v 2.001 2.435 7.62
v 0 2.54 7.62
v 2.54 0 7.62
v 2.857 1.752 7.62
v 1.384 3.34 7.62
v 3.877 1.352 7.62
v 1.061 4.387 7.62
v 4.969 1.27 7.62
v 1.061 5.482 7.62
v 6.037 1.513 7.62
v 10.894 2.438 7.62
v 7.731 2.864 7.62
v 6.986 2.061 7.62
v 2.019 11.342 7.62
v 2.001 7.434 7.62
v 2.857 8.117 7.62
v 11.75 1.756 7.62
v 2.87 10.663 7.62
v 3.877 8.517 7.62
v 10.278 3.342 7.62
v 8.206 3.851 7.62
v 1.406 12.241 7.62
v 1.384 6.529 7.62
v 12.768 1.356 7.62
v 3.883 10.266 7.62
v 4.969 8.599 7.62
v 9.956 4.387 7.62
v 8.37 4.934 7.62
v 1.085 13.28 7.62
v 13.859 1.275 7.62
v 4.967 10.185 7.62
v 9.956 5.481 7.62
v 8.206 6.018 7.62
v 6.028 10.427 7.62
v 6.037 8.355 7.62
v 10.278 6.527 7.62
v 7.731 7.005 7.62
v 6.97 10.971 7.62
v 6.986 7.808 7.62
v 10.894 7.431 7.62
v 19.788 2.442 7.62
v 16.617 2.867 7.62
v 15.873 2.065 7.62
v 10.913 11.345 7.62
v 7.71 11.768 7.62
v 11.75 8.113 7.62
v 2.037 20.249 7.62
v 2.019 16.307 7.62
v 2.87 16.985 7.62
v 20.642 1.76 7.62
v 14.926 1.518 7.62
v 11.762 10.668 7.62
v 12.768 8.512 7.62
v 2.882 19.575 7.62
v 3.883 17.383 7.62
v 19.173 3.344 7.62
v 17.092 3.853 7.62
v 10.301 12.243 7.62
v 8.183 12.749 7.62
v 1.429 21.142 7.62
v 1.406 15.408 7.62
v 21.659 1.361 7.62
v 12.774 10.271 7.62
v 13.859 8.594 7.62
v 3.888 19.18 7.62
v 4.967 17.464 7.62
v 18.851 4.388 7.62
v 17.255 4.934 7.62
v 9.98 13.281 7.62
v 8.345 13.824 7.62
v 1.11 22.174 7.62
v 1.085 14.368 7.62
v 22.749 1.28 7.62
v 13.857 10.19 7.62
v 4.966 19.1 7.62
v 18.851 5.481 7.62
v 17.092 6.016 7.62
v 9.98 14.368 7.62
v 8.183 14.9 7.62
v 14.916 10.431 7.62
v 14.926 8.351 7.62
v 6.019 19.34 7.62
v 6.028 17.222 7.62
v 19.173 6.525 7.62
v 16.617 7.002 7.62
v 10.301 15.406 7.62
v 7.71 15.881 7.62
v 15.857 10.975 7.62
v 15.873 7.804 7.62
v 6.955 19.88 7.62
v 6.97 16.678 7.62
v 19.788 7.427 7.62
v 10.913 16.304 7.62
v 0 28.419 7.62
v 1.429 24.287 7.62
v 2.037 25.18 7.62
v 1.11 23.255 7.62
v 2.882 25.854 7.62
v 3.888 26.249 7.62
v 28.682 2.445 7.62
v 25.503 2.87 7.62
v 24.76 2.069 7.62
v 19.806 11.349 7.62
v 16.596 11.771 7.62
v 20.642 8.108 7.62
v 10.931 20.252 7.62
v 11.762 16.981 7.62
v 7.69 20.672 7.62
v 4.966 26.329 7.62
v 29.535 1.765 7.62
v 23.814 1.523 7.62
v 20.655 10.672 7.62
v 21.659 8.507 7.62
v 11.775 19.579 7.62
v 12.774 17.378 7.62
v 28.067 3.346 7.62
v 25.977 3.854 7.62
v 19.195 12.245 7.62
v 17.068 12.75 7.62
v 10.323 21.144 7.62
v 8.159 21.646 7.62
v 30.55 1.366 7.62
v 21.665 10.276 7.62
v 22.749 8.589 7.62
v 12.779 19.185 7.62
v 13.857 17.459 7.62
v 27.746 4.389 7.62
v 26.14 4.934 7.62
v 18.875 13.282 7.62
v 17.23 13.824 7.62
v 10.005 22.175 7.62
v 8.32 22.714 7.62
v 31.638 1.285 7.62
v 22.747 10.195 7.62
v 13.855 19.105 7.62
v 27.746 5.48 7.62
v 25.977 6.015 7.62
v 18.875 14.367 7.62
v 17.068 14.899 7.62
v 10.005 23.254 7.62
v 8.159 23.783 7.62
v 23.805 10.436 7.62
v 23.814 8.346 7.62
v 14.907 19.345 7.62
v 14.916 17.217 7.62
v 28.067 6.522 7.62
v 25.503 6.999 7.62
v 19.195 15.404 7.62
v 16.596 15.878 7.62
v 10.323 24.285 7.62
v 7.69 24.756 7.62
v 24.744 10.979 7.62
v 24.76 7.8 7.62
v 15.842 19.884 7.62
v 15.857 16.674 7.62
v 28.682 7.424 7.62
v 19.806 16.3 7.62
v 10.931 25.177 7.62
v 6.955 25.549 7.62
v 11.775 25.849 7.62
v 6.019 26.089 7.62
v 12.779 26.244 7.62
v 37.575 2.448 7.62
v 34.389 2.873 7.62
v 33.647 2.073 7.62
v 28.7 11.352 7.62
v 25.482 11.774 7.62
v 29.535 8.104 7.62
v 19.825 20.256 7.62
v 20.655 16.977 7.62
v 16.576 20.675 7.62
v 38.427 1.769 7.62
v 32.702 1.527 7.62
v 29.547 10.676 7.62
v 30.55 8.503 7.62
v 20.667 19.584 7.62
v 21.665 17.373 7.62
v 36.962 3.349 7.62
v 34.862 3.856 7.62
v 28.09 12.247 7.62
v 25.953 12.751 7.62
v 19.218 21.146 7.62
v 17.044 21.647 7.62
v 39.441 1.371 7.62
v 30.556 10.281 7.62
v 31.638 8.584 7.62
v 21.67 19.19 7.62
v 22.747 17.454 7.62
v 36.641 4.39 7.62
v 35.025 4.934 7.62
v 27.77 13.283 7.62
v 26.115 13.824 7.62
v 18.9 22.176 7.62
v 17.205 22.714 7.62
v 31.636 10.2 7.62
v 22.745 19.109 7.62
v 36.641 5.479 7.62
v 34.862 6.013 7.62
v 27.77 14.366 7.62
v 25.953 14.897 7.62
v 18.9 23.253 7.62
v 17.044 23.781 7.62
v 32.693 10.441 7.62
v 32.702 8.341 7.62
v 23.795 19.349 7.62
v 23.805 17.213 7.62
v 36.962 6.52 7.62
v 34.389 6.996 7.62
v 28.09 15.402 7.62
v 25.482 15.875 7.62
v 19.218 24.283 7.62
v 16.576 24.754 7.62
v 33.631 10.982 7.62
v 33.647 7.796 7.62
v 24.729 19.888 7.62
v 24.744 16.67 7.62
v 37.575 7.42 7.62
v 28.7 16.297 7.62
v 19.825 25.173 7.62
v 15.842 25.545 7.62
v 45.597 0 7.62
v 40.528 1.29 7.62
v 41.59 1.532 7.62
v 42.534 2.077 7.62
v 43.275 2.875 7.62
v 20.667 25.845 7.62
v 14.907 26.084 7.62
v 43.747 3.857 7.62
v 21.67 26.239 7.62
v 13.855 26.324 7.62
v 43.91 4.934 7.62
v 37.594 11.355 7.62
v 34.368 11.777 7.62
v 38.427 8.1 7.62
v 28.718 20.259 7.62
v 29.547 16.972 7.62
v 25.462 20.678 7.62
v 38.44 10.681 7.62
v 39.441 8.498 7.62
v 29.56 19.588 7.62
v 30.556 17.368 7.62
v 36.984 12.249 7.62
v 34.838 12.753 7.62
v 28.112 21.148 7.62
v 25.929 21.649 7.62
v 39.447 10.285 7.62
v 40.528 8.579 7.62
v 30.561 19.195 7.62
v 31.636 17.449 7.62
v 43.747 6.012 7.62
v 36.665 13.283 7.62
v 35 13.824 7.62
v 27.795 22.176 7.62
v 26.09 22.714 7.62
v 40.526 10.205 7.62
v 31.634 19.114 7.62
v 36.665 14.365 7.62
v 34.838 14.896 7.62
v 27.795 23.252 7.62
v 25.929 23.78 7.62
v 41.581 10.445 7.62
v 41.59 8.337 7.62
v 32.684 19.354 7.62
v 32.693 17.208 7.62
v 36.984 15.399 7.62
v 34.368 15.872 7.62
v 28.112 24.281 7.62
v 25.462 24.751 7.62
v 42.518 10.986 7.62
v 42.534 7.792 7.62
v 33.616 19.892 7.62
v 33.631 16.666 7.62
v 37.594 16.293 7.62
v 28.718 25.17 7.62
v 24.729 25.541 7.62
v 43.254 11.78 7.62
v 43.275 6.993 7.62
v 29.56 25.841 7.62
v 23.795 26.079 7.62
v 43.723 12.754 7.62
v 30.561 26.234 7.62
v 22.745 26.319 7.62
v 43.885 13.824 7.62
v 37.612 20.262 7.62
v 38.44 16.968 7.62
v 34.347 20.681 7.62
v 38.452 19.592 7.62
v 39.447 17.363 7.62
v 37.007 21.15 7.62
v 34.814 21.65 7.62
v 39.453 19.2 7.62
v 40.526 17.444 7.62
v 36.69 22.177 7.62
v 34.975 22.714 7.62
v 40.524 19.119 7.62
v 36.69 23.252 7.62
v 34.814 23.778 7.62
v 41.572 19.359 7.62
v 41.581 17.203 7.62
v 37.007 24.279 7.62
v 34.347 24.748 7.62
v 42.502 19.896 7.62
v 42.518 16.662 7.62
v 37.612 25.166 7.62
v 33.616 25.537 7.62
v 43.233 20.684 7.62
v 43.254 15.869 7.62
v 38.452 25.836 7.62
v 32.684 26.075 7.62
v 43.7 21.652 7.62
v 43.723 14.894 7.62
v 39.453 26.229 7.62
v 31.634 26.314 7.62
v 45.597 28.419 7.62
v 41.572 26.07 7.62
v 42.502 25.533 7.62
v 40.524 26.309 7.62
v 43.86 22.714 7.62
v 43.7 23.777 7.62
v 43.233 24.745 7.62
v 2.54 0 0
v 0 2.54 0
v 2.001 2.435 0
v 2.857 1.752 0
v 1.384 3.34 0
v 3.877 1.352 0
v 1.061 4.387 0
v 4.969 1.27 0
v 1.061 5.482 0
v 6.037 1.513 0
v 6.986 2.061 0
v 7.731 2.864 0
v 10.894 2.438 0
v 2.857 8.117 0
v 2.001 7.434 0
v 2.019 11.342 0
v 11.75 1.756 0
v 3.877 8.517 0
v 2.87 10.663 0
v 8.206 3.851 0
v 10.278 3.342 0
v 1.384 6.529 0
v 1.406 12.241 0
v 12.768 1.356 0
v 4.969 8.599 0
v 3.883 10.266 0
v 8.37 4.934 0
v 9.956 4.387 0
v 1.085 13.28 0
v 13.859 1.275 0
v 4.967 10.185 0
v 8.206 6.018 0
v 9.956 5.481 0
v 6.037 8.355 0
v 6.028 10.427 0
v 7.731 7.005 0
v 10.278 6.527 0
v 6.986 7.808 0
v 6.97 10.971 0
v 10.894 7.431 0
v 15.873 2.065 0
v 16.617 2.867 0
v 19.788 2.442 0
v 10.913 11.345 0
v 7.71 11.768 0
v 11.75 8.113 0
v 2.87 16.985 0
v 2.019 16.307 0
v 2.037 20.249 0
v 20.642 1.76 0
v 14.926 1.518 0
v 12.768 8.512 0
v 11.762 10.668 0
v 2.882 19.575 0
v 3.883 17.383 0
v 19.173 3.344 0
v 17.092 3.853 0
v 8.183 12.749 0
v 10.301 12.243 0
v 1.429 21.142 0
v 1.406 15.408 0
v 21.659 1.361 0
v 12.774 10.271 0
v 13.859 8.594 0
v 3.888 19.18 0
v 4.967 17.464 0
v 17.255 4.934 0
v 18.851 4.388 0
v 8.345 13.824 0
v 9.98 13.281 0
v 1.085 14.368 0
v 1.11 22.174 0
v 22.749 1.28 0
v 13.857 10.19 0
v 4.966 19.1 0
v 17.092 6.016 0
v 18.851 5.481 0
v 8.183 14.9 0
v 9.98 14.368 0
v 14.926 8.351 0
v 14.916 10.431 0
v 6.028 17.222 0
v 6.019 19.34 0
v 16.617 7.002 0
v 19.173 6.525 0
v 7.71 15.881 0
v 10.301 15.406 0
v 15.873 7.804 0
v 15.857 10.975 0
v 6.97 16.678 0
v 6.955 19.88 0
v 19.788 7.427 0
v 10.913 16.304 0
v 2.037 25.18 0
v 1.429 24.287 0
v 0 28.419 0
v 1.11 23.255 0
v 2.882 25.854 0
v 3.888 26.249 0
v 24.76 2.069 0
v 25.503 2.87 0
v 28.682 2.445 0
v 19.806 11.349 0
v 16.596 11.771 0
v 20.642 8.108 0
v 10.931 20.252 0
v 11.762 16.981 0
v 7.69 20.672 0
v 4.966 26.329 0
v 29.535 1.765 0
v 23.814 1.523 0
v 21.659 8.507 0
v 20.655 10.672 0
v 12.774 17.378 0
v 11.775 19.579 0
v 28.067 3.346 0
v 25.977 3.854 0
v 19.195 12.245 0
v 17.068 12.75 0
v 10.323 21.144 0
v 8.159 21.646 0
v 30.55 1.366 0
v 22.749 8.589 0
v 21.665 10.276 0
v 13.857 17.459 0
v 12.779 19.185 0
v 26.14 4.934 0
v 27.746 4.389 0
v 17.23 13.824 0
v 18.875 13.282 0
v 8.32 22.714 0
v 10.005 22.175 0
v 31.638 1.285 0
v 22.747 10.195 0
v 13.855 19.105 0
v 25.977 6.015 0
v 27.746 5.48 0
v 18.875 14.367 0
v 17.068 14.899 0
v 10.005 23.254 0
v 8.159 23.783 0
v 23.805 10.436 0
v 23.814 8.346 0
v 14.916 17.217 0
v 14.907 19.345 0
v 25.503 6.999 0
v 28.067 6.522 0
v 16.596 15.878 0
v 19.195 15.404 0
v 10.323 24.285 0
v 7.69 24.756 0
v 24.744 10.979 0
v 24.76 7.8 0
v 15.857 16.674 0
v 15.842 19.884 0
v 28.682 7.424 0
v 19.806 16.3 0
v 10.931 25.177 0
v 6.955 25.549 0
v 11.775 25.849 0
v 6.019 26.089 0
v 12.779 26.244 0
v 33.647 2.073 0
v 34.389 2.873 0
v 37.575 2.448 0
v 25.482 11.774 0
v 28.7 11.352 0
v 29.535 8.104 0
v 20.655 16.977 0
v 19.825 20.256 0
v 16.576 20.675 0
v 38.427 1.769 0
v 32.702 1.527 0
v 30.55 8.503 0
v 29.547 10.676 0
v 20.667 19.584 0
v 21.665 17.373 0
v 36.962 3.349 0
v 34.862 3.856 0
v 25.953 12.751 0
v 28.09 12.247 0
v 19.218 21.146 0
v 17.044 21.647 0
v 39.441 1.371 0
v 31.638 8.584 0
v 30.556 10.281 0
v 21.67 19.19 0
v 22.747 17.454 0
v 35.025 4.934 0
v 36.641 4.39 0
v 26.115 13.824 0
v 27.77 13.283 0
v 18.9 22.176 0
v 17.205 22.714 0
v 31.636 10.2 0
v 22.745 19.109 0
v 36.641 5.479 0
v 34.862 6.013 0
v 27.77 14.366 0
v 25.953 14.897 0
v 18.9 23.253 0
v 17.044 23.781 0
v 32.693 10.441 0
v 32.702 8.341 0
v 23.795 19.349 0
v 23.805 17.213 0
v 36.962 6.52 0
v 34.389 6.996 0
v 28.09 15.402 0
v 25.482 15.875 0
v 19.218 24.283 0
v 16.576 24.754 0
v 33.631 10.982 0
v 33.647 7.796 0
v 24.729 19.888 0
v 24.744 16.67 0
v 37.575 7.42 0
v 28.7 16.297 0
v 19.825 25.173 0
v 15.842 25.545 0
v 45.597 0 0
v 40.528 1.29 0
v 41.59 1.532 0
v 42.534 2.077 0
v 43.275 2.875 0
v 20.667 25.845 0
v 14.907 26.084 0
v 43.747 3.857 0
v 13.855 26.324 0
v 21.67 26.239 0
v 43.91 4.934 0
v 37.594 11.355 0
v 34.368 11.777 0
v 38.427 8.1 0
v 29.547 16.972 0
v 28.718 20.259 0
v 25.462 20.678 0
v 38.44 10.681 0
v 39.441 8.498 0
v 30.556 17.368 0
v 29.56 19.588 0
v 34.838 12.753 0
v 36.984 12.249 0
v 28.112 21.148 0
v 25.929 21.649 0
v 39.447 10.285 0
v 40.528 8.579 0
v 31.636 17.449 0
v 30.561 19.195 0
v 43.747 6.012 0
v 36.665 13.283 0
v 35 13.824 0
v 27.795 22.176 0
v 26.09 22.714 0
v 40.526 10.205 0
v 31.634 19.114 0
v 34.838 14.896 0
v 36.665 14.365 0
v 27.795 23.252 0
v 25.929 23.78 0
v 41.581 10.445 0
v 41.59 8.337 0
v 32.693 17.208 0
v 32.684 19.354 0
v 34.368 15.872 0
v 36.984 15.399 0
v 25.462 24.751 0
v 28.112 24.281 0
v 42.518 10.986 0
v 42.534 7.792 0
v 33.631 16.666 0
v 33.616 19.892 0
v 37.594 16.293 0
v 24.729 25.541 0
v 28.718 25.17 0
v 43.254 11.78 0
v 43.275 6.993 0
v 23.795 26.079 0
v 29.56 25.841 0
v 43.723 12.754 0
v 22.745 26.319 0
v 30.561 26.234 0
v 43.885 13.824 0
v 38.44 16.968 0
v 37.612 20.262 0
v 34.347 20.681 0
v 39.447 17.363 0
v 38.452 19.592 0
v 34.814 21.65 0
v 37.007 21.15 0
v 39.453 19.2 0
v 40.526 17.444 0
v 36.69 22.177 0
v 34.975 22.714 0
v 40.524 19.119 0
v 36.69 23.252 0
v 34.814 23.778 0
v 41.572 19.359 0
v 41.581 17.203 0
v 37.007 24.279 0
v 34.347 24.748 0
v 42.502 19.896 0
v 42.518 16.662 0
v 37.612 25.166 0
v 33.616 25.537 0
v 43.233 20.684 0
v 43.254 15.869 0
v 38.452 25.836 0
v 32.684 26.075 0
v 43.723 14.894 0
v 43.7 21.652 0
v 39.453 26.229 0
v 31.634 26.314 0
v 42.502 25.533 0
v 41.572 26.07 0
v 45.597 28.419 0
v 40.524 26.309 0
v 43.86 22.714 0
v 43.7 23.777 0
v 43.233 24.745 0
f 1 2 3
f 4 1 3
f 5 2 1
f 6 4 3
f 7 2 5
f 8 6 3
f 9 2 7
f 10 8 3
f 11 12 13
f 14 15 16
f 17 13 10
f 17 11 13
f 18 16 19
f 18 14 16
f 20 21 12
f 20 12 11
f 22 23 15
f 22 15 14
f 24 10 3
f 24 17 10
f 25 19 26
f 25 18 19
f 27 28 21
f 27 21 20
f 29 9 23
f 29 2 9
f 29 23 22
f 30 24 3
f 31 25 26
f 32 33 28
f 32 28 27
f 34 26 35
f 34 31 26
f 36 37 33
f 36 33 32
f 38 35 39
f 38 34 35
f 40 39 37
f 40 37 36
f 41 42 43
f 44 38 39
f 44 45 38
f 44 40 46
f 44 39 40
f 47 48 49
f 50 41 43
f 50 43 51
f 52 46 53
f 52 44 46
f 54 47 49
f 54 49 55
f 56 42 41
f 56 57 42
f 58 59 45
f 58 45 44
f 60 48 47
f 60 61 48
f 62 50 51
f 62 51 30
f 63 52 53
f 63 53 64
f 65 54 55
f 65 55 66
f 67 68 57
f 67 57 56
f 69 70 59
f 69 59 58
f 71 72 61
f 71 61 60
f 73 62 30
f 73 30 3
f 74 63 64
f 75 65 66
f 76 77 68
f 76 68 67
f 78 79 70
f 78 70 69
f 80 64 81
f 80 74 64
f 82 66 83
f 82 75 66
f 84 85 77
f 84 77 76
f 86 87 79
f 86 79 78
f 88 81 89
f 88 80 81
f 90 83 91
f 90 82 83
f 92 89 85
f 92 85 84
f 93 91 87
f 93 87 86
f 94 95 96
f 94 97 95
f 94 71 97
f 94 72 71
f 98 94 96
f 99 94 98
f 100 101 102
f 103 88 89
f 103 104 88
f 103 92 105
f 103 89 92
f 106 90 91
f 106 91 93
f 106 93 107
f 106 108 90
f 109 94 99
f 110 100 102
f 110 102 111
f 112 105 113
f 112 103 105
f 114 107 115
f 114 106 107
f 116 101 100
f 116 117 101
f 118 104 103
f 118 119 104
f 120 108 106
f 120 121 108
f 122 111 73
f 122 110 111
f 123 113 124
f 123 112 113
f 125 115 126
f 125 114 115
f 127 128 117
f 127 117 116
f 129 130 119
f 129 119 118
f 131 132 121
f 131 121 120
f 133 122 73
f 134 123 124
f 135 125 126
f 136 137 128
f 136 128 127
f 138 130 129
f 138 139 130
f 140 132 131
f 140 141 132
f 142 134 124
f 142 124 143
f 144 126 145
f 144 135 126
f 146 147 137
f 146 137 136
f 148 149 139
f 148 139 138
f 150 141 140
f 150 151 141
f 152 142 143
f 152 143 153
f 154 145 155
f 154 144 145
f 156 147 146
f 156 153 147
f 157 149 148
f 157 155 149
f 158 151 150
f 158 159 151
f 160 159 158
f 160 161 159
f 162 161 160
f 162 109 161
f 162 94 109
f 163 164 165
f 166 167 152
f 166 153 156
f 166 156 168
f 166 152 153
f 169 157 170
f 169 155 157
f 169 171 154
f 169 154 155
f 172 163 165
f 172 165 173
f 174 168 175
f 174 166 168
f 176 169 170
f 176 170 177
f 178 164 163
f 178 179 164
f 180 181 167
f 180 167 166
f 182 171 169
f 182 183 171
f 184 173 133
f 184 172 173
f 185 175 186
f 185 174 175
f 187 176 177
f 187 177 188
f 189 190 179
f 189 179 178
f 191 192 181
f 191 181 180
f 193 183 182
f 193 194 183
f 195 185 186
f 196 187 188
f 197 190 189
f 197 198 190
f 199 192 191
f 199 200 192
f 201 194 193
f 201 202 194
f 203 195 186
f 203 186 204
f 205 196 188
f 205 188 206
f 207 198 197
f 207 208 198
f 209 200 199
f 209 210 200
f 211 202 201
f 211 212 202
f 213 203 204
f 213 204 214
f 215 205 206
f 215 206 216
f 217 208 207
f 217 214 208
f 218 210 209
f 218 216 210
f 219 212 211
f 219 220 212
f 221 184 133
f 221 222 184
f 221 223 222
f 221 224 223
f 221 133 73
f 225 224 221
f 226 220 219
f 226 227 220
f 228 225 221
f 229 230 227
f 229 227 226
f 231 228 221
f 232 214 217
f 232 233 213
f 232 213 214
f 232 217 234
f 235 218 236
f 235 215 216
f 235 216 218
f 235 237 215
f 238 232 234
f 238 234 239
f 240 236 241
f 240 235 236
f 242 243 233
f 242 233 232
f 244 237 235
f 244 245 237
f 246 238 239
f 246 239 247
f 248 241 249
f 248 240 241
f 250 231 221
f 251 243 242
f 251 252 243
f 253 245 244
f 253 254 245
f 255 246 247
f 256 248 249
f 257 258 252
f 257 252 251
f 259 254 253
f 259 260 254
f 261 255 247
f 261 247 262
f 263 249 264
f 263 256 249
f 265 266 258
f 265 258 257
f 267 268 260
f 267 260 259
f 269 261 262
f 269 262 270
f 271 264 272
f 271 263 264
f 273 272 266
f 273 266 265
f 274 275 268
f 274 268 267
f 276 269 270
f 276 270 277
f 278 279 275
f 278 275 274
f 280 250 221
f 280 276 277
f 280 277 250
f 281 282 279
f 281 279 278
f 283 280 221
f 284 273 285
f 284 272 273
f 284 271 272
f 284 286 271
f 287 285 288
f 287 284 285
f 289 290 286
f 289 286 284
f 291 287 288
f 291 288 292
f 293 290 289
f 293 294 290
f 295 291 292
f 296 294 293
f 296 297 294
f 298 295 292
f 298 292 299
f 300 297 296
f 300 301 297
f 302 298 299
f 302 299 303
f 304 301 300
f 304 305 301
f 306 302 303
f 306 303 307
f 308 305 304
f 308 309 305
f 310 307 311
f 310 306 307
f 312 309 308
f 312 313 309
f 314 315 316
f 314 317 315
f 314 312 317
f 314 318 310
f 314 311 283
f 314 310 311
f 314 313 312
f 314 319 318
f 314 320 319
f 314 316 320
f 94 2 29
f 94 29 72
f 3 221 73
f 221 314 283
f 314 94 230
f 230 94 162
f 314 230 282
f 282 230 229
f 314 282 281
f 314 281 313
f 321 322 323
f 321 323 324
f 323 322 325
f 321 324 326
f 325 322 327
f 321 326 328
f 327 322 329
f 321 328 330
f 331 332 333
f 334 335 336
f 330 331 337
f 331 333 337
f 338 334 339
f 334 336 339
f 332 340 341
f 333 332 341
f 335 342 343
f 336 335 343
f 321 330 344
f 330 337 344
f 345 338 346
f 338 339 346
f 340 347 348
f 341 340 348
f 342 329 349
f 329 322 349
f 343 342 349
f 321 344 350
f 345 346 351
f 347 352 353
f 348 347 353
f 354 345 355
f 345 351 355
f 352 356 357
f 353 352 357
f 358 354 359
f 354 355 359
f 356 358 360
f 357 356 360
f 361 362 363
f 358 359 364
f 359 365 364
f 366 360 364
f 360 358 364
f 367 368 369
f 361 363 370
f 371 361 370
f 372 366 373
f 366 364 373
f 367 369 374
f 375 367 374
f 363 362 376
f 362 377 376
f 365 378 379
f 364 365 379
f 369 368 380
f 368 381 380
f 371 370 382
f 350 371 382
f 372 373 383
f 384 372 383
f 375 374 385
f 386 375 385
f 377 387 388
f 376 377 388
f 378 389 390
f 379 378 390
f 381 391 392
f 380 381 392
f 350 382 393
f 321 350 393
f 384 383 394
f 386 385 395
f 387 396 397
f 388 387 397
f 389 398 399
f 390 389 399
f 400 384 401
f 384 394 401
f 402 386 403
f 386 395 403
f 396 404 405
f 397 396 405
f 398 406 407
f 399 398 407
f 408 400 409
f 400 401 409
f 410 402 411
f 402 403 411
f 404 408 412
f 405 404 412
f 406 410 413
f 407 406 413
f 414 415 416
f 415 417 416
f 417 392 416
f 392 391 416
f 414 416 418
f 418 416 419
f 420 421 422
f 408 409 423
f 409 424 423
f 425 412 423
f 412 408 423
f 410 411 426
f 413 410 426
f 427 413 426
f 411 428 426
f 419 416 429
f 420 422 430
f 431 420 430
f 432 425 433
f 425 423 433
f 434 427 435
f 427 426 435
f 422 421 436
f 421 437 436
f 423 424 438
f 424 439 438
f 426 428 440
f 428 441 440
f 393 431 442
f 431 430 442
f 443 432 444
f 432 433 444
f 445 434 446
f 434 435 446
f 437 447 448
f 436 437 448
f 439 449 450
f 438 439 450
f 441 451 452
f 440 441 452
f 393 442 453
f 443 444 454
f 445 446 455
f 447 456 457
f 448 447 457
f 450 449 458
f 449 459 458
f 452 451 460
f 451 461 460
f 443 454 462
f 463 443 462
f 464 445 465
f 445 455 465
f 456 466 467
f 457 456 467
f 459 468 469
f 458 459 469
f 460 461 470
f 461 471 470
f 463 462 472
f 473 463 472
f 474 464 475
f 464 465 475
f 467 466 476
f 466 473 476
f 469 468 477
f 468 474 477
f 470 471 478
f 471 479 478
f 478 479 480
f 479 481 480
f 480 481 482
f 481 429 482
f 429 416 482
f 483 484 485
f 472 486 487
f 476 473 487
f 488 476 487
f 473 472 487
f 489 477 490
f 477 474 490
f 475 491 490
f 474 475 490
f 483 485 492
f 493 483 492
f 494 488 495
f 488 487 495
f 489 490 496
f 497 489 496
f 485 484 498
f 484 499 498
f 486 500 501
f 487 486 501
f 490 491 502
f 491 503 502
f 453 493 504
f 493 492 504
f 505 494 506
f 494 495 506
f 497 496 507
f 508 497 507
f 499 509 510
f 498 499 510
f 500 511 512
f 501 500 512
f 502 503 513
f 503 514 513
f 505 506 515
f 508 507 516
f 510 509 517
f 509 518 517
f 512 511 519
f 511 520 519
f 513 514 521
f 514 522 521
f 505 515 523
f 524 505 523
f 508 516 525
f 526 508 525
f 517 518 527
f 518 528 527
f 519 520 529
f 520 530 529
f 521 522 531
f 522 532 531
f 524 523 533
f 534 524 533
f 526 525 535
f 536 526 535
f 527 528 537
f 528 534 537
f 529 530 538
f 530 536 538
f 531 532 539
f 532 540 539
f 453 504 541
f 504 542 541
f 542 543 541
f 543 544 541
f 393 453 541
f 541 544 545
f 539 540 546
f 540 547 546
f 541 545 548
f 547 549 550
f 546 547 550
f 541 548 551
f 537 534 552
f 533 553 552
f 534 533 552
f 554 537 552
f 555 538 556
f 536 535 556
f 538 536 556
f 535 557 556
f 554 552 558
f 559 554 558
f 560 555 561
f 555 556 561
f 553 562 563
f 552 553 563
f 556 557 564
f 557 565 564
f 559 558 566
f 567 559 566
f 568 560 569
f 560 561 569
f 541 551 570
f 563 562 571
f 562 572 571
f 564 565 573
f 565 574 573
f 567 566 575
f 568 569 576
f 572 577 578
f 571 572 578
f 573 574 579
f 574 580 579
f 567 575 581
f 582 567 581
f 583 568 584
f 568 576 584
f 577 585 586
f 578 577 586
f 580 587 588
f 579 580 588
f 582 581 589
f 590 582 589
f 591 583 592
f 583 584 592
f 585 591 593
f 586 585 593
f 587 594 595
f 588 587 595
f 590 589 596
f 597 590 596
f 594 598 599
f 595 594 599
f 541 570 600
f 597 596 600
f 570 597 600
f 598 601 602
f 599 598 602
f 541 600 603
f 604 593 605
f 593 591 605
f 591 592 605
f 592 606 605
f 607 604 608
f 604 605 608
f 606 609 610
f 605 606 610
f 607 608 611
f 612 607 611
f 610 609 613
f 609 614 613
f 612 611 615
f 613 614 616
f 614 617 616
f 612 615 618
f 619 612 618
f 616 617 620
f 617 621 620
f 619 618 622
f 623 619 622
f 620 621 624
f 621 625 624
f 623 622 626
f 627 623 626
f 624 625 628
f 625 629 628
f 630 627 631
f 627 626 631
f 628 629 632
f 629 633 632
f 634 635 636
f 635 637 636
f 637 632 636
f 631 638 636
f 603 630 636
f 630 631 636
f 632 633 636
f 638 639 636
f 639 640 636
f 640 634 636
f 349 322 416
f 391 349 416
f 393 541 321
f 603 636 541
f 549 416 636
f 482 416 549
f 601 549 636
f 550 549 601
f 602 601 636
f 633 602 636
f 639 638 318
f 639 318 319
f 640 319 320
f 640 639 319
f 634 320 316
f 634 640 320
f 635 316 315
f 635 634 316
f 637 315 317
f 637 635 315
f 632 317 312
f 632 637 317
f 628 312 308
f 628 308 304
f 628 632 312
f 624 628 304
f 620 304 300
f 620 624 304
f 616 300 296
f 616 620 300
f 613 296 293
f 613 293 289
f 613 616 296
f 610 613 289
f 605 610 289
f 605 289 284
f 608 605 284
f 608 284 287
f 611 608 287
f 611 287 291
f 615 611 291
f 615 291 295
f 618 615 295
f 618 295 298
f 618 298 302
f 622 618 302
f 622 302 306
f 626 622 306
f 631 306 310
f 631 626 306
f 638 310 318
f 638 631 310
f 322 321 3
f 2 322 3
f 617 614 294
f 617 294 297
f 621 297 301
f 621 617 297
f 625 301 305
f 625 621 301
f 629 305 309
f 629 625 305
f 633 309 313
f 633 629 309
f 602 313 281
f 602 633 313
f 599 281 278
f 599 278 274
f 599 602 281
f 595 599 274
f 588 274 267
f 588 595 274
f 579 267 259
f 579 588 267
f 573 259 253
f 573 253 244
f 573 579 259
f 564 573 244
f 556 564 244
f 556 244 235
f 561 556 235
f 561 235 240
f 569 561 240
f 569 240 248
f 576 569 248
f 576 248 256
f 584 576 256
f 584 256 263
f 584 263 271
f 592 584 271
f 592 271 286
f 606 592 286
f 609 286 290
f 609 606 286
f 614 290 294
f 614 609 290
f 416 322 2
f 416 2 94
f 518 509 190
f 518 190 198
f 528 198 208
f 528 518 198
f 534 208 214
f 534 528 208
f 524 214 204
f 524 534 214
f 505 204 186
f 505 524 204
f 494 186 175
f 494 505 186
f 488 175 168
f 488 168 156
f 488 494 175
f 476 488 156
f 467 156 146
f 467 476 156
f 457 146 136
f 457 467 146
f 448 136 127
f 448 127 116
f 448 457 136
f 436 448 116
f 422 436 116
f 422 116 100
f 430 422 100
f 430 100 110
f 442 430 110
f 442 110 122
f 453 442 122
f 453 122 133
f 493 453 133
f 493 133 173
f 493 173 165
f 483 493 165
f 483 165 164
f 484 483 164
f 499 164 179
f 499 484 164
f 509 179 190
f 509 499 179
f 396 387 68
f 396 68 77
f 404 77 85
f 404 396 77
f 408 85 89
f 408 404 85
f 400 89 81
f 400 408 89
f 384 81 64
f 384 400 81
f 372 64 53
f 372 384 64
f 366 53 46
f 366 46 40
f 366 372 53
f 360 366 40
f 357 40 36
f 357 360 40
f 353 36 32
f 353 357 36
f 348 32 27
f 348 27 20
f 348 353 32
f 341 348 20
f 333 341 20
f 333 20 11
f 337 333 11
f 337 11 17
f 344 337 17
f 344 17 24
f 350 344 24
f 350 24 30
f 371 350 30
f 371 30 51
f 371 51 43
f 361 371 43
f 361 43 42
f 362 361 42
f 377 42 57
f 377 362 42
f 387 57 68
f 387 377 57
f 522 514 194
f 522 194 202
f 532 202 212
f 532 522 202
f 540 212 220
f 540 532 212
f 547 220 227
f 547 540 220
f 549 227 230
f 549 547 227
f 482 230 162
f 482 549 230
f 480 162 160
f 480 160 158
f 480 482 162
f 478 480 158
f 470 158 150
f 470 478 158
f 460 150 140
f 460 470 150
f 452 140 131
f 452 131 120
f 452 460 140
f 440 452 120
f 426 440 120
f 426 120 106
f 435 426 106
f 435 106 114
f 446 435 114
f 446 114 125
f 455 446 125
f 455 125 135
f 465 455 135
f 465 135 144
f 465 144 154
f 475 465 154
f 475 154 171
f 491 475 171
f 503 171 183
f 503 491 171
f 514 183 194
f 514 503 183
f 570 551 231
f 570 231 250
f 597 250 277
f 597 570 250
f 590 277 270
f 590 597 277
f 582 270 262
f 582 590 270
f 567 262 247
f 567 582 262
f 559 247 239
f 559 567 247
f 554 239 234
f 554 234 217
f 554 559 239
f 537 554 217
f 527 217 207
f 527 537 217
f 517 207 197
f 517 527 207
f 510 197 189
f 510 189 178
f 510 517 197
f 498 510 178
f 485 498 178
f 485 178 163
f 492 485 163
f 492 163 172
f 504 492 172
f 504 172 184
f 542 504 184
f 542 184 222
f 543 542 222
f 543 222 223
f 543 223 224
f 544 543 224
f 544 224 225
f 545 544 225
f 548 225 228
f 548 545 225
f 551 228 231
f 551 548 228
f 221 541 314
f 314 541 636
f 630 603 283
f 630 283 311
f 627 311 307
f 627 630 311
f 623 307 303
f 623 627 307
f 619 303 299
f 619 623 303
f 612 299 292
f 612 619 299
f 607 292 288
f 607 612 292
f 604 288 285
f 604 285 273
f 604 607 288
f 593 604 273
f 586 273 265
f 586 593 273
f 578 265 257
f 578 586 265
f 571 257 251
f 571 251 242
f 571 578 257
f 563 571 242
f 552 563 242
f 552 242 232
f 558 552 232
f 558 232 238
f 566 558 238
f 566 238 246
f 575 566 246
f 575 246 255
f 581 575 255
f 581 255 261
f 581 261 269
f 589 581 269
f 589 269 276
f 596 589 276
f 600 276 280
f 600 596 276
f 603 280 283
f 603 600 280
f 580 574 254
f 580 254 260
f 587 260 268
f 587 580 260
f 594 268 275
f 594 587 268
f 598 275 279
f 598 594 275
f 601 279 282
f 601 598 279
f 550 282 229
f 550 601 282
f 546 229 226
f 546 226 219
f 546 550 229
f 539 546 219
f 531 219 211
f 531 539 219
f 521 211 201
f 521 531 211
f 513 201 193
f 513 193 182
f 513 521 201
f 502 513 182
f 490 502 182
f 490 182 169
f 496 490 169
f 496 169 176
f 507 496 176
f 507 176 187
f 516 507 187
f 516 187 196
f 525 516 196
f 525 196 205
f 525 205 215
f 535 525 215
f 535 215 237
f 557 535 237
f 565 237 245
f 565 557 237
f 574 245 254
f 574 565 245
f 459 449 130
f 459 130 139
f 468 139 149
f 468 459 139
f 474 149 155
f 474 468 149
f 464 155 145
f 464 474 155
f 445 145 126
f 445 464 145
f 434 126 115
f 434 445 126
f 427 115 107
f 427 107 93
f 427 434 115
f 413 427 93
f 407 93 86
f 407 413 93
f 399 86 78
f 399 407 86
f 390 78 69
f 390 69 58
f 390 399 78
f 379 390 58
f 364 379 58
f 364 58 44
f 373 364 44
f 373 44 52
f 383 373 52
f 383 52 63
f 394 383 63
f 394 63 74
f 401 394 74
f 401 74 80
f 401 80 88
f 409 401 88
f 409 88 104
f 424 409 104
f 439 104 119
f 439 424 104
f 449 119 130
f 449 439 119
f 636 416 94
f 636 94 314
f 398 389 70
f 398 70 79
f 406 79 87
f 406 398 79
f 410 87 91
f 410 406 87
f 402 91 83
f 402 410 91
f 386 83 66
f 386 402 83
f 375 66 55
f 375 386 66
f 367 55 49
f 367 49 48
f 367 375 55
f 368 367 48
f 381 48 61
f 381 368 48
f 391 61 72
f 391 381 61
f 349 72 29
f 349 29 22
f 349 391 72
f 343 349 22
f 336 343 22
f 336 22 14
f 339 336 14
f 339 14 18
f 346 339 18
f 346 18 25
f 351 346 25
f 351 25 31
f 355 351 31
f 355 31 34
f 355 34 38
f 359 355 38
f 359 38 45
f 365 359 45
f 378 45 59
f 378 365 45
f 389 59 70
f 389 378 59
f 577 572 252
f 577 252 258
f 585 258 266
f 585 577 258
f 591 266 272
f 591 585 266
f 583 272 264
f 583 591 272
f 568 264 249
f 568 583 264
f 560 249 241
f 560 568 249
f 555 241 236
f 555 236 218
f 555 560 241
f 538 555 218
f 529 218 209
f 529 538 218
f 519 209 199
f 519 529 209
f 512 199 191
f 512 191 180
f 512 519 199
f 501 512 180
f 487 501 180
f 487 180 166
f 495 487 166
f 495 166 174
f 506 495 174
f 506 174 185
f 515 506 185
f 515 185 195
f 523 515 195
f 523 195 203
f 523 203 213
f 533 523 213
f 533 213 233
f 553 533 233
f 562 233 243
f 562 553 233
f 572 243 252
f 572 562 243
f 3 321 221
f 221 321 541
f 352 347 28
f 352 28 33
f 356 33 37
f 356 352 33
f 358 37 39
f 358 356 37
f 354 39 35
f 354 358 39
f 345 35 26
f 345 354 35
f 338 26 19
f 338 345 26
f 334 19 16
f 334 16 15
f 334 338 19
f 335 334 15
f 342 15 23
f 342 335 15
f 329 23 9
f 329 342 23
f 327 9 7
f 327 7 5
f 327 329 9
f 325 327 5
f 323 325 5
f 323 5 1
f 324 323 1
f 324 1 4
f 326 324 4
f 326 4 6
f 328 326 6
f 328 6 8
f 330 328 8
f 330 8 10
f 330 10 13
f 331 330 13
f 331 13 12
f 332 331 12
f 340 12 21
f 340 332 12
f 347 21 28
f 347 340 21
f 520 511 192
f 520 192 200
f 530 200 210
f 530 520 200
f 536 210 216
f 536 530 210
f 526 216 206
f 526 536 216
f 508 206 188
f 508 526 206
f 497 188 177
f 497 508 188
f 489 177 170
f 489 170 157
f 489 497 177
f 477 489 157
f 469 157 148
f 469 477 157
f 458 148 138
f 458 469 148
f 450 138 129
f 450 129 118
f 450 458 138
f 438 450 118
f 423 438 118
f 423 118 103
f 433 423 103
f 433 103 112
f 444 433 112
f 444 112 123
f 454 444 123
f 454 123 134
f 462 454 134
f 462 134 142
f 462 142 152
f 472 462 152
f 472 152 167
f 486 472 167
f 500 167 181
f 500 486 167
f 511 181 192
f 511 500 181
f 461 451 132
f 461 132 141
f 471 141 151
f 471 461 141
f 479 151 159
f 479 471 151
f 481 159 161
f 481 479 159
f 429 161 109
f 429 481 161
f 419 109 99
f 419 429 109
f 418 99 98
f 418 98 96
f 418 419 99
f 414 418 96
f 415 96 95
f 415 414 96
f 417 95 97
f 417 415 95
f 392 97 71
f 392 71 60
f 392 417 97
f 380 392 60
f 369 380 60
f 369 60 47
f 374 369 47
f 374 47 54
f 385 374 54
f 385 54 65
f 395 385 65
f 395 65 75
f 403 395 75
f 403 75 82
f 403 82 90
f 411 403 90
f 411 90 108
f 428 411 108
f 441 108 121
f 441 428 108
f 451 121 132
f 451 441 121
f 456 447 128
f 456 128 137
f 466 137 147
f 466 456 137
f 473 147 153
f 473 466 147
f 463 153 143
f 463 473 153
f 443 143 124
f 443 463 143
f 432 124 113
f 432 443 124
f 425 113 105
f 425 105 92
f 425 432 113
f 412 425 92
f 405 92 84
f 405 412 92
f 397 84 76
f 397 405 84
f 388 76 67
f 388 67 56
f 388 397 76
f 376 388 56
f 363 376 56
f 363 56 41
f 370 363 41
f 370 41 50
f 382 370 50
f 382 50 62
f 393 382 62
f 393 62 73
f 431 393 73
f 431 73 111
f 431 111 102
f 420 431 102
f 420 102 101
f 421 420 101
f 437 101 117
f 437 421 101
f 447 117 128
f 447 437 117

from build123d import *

# Parameters (mm, degrees)
SKETCH1_W           = 45.596558684
SKETCH1_H           = 28.418694735
SKETCH1_R           = 3.675
SKETCH1_R_2         = 3.67
SKETCH1_R_3         = 3.665
SKETCH1_R_4         = 3.66
SKETCH1_R_5         = 3.655
SKETCH1_R_6         = 3.645
SKETCH1_R_7         = 3.64
SKETCH1_R_8         = 3.635
SKETCH1_R_9         = 3.63
SKETCH1_R_10        = 3.62
SKETCH1_R_11        = 3.615
SKETCH1_R_12        = 3.61
SKETCH1_R_13        = 3.605
SKETCH1_R_14        = 3.65
SKETCH1_R_15        = 3.625
BOSS_EXTRUDE1_DEPTH = 7.62
CHAMFER1_SIZE       = 2.54


with BuildPart() as part:
    # Sketch1 → Boss-Extrude1 (new body)
    with BuildSketch(Plane.XY):
        with Locations((22.798279342, 14.209347368)):
            Rectangle(SKETCH1_W, SKETCH1_H)
        with Locations((4.694723918, 4.934387692)):
            Circle(SKETCH1_R, mode=Mode.SUBTRACT)
        with Locations((13.584723918, 4.934387692)):
            Circle(SKETCH1_R_2, mode=Mode.SUBTRACT)
        with Locations((22.474723918, 4.934387692)):
            Circle(SKETCH1_R_3, mode=Mode.SUBTRACT)
        with Locations((31.364723918, 4.934387692)):
            Circle(SKETCH1_R_4, mode=Mode.SUBTRACT)
        with Locations((40.254723918, 4.934387692)):
            Circle(SKETCH1_R_5, mode=Mode.SUBTRACT)
        with Locations((13.584723918, 13.824387692)):
            Circle(SKETCH1_R_6, mode=Mode.SUBTRACT)
        with Locations((22.474723918, 13.824387692)):
            Circle(SKETCH1_R_7, mode=Mode.SUBTRACT)
        with Locations((31.364723918, 13.824387692)):
            Circle(SKETCH1_R_8, mode=Mode.SUBTRACT)
        with Locations((40.254723918, 13.824387692)):
            Circle(SKETCH1_R_9, mode=Mode.SUBTRACT)
        with Locations((13.584723918, 22.714387692)):
            Circle(SKETCH1_R_10, mode=Mode.SUBTRACT)
        with Locations((22.474723918, 22.714387692)):
            Circle(SKETCH1_R_11, mode=Mode.SUBTRACT)
        with Locations((31.364723918, 22.714387692)):
            Circle(SKETCH1_R_12, mode=Mode.SUBTRACT)
        with Locations((40.254723918, 22.714387692)):
            Circle(SKETCH1_R_13, mode=Mode.SUBTRACT)
        with Locations((4.694723918, 13.824387692)):
            Circle(SKETCH1_R_14, mode=Mode.SUBTRACT)
        with Locations((4.694723918, 22.714387692)):
            Circle(SKETCH1_R_15, mode=Mode.SUBTRACT)
    extrude(amount=BOSS_EXTRUDE1_DEPTH)

    # Chamfer1
    chamfer1_edges = [part.edges().sort_by_distance(p)[0] for p in [
        (0, 0, 3.81),
    ]]
    chamfer(chamfer1_edges, length=CHAMFER1_SIZE)


solid = part.part
